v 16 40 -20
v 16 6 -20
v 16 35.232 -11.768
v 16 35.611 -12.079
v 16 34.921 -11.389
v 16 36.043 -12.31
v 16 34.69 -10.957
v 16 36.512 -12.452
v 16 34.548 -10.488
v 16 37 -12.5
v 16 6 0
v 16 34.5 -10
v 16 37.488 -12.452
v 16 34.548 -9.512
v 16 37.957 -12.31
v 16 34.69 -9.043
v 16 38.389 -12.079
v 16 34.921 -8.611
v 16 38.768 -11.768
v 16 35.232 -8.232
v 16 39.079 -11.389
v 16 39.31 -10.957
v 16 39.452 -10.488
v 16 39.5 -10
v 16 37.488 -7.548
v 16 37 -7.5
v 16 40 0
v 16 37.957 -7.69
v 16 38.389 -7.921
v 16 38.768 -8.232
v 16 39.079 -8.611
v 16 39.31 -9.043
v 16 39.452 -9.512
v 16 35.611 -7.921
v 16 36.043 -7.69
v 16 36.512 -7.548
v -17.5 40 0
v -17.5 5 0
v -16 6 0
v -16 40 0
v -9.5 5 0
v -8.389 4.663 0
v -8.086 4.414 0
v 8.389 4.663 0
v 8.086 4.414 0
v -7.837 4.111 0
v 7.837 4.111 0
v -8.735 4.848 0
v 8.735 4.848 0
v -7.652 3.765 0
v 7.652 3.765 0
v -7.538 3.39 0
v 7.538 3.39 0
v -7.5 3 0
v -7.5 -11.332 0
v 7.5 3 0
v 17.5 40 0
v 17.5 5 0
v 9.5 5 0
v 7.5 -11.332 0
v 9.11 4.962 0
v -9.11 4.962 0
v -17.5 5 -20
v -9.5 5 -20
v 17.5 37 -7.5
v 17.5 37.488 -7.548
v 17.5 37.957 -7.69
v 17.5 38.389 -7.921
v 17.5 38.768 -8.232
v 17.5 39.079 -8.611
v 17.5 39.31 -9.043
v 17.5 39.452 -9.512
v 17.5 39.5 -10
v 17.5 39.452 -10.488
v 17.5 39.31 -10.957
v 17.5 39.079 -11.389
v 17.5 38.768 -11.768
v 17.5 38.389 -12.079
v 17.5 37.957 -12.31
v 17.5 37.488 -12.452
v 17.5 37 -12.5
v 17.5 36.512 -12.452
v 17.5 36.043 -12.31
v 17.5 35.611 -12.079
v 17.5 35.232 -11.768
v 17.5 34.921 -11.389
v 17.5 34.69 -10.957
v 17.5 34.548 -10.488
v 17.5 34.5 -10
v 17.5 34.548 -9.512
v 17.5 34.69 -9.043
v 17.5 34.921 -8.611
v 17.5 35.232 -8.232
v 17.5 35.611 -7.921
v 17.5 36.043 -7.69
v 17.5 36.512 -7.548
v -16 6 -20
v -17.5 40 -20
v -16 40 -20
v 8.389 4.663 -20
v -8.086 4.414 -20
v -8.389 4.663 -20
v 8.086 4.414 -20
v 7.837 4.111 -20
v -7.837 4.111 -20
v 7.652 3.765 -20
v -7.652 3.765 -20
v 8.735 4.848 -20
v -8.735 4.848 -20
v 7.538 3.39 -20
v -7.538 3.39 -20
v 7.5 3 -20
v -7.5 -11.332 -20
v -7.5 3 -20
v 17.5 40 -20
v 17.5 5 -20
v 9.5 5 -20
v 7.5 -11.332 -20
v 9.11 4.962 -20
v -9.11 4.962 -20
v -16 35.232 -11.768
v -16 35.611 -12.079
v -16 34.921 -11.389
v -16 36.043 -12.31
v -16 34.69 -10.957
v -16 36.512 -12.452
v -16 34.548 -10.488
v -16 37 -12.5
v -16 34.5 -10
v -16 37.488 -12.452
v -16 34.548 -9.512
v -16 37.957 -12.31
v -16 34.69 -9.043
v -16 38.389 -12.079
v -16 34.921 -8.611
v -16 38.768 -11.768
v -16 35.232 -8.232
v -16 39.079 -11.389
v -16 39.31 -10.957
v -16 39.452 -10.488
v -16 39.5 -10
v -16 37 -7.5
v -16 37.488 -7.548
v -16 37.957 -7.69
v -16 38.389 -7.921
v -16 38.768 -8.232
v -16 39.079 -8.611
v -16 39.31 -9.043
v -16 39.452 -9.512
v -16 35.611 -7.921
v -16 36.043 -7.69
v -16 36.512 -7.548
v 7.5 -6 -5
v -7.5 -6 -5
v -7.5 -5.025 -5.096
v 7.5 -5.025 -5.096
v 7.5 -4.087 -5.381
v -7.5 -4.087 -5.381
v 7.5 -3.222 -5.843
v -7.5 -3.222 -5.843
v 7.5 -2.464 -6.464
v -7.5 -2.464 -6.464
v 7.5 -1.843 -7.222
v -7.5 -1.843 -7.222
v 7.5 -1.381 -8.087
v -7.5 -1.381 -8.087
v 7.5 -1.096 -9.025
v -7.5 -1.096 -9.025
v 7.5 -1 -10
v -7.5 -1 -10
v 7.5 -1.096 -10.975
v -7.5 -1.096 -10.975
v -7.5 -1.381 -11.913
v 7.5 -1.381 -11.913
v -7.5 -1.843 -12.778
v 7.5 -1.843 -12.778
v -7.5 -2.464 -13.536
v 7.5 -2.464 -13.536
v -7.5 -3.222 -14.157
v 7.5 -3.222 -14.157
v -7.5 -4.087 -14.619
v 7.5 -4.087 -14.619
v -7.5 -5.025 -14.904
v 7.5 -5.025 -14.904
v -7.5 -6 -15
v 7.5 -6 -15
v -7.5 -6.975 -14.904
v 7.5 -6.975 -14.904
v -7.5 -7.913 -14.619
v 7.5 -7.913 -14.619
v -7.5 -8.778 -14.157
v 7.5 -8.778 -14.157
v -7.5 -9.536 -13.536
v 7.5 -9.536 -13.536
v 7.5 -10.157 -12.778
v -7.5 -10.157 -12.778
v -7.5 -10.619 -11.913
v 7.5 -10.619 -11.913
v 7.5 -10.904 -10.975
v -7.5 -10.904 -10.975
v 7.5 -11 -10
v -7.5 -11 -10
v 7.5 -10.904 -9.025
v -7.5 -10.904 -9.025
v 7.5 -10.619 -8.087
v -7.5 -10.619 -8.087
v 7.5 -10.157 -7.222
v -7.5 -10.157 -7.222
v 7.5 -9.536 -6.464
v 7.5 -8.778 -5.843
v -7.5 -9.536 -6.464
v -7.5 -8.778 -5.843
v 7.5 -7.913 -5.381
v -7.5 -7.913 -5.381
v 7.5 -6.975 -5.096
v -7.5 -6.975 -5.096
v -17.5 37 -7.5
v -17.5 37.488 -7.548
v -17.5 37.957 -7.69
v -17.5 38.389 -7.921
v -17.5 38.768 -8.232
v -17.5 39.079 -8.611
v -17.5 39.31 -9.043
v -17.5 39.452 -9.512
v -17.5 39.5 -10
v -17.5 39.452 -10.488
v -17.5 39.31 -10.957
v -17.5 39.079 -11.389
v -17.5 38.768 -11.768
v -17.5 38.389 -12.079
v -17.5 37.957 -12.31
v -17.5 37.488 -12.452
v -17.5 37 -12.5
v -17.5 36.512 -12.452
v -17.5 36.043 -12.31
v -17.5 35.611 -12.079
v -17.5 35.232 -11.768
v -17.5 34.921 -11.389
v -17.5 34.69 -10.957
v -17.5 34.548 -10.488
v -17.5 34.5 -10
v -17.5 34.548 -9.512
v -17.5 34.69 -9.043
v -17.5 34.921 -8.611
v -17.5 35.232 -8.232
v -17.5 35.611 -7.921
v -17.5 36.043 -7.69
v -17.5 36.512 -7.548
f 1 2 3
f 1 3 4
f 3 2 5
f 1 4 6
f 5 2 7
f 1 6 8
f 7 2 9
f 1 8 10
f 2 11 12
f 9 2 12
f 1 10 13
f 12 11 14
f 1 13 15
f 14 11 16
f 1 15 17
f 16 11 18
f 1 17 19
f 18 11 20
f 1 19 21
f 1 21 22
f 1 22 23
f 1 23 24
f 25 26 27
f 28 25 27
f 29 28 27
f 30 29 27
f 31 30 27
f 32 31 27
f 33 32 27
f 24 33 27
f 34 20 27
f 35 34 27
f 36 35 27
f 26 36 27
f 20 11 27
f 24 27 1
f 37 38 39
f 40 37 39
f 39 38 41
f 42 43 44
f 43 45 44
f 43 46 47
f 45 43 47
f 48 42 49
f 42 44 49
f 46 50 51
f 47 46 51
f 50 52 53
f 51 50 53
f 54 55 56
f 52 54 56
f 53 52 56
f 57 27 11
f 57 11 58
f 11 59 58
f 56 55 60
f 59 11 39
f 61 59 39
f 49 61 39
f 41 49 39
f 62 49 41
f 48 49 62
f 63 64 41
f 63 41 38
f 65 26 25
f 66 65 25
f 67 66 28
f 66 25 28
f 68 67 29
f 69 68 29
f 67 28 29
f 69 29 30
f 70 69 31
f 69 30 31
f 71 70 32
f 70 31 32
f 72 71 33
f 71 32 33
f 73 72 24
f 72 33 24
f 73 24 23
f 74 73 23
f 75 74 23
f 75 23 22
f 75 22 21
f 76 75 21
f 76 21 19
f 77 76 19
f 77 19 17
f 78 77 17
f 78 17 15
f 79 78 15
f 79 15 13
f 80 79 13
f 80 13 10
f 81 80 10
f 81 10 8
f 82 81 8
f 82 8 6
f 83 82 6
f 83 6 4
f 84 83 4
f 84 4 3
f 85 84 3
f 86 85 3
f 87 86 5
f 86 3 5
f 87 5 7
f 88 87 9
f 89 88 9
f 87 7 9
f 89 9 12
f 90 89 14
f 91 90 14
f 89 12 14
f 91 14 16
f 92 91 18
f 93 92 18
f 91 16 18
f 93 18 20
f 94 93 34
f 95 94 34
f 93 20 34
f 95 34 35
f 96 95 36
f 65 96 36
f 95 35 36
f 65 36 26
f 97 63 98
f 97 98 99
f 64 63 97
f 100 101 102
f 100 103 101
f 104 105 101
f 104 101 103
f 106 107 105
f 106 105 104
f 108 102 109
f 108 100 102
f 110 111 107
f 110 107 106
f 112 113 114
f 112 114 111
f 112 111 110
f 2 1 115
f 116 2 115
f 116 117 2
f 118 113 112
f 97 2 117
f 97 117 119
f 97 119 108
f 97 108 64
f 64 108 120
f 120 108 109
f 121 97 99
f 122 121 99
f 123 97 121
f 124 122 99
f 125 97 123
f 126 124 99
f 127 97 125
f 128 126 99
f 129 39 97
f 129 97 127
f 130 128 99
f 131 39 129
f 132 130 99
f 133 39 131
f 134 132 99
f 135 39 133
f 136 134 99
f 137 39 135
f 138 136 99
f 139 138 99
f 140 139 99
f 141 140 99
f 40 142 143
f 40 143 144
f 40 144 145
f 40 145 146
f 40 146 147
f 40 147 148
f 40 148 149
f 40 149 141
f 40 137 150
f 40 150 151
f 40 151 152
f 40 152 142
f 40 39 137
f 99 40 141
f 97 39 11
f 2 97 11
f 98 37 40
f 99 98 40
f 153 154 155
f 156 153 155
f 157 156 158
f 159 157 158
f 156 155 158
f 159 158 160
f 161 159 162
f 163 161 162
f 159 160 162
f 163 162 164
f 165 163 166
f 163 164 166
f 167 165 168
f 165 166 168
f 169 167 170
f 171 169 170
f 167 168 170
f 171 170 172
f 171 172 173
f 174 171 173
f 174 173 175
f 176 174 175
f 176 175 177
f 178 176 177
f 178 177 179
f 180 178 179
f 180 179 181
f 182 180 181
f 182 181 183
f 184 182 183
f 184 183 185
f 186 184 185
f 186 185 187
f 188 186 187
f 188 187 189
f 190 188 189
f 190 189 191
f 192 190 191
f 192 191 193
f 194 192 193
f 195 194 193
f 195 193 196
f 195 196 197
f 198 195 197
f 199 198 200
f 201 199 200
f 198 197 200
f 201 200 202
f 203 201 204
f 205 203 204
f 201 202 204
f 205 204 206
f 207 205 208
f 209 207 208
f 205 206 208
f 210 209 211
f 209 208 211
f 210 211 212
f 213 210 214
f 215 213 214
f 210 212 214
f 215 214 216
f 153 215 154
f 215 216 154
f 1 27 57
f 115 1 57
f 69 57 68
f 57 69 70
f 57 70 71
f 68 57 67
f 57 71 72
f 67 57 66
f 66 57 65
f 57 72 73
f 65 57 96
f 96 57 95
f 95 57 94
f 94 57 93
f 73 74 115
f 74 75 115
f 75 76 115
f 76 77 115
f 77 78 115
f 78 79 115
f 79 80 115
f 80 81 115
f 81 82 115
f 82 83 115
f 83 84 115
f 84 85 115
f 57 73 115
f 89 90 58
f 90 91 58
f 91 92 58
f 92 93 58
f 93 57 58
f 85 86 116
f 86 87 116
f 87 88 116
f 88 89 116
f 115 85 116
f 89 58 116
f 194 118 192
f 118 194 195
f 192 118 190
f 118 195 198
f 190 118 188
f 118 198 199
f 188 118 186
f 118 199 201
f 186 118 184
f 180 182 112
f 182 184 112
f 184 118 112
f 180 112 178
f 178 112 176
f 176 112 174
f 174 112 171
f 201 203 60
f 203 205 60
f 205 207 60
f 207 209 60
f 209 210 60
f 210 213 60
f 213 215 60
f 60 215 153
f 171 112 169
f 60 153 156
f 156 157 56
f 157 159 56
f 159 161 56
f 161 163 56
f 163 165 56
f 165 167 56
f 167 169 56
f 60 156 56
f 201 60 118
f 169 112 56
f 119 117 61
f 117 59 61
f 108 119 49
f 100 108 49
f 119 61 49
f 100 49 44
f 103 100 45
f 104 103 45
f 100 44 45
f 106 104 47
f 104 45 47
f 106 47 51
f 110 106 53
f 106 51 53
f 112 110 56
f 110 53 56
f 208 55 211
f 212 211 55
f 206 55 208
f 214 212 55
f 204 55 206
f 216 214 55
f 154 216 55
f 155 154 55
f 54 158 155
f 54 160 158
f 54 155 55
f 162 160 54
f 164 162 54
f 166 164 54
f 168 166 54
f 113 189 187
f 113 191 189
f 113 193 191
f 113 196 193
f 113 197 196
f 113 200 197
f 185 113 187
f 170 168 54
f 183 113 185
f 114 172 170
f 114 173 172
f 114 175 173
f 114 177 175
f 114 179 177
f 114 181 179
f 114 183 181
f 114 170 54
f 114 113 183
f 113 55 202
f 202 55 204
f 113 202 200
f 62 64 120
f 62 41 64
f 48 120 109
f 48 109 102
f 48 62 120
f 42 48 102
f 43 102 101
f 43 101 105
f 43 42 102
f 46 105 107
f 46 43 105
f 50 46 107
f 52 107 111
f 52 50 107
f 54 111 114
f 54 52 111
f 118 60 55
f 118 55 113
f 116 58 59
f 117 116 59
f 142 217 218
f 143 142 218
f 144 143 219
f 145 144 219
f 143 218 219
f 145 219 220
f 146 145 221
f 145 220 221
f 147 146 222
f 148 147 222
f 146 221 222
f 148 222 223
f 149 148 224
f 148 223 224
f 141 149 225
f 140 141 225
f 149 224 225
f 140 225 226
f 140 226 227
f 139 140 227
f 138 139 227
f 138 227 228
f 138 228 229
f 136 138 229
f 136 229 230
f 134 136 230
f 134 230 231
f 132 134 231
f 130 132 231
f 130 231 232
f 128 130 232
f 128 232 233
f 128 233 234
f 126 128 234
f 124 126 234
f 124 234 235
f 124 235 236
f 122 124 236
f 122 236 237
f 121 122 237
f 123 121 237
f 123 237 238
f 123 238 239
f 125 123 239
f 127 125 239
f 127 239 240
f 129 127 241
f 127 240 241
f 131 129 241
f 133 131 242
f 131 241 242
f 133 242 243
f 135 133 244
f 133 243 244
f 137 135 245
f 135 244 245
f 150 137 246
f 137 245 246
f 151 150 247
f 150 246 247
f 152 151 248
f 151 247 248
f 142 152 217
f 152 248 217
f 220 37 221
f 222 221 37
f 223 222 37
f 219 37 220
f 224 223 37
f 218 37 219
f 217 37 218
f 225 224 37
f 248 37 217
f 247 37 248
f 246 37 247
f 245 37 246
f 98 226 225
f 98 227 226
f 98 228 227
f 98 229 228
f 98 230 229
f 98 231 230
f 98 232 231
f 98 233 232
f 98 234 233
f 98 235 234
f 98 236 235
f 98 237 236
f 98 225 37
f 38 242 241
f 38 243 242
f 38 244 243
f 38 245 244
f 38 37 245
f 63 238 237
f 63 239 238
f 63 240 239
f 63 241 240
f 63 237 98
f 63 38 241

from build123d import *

# Parameters (mm, degrees)
SKETCH1_W               = 35
SKETCH1_H               = 20
BOSS_EXTRUDE1_DEPTH     = 40
SKETCH2_W               = 15
SKETCH2_H               = 20
BOSS_EXTRUDE2_DEPTH     = 16
SKETCH3_R               = 5
CUT_EXTRUDE1_DEPTH      = 26
FILLET3_R               = 3
SKETCH4_W               = 32
SKETCH4_H               = 34
CUT_EXTRUDE2_DEPTH      = 21
SKETCH5_R               = 2.5
CUT_EXTRUDE3_DEPTH      = 36
SKETCH7_W               = 10
SKETCH7_H               = 5
CUT_EXTRUDE4_DEPTH      = 21
FILLET5_R               = 2
SKETCH8_W               = 20
SKETCH8_H               = 4.66822317
CUT_EXTRUDE5_DEPTH      = 18.5
CUT_EXTRUDE5_DEPTH_BACK = 18.5


with BuildPart() as part:
    # Sketch1 → Boss-Extrude1 (new body)
    with BuildSketch(Plane(origin=(0, 0, 0), x_dir=(1, 0, 0), z_dir=(0, 1, 0))):
        with Locations((0, 10)):
            Rectangle(SKETCH1_W, SKETCH1_H)
    extrude(amount=BOSS_EXTRUDE1_DEPTH)

    # Sketch2 → Boss-Extrude2 (add)
    with BuildSketch(Plane.XZ):
        with Locations((0, -10)):
            Rectangle(SKETCH2_W, SKETCH2_H)
    extrude(amount=BOSS_EXTRUDE2_DEPTH)

    # Sketch3 → Cut-Extrude1 (cut, through all)
    with BuildSketch(Plane.ZY.offset(7.5)):
        with Locations((-10, -6)):
            Circle(SKETCH3_R)
    extrude(amount=-CUT_EXTRUDE1_DEPTH, mode=Mode.SUBTRACT)

    # Fillet3
    fillet3_edges = [part.edges().sort_by_distance(p)[0] for p in [
        (7.5, -16, -10),
        (-7.5, -16, -10),
    ]]
    fillet(fillet3_edges, radius=FILLET3_R)

    # Sketch4 → Cut-Extrude2 (cut, through all)
    with BuildSketch(Plane.XY):
        with Locations((0, 23)):
            Rectangle(SKETCH4_W, SKETCH4_H)
    extrude(amount=-CUT_EXTRUDE2_DEPTH, mode=Mode.SUBTRACT)

    # Sketch5 → Cut-Extrude3 (cut, through all)
    with BuildSketch(Plane.ZY.offset(17.5)):
        with Locations((-10, 37)):
            Circle(SKETCH5_R)
    extrude(amount=-CUT_EXTRUDE3_DEPTH, mode=Mode.SUBTRACT)

    # Sketch7 → Cut-Extrude4 (cut, through all)
    with BuildSketch(Plane(origin=(0, 0, -20), x_dir=(-1, 0, 0), z_dir=(0, 0, -1))):
        with Locations((12.5, 2.5)):
            Rectangle(SKETCH7_W, SKETCH7_H)
        with Locations((-12.5, 2.5)):
            Rectangle(SKETCH7_W, SKETCH7_H)
    extrude(amount=-CUT_EXTRUDE4_DEPTH, mode=Mode.SUBTRACT)

    # Fillet5
    fillet5_edges = [part.edges().sort_by_distance(p)[0] for p in [
        (7.5, 5, -10),
        (-7.5, 5, -10),
    ]]
    fillet(fillet5_edges, radius=FILLET5_R)

    # Sketch8 → Cut-Extrude5 (cut, two sides)
    with BuildSketch(Plane(origin=(0, 0, 0), x_dir=(0, 0, -1), z_dir=(1, 0, 0))) as cut_extrude5_sk:
        with Locations((10, -13.665888415)):
            Rectangle(SKETCH8_W, SKETCH8_H)
    extrude(amount=CUT_EXTRUDE5_DEPTH, mode=Mode.SUBTRACT)
    extrude(cut_extrude5_sk.sketch, amount=-CUT_EXTRUDE5_DEPTH_BACK, mode=Mode.SUBTRACT)


solid = part.part
